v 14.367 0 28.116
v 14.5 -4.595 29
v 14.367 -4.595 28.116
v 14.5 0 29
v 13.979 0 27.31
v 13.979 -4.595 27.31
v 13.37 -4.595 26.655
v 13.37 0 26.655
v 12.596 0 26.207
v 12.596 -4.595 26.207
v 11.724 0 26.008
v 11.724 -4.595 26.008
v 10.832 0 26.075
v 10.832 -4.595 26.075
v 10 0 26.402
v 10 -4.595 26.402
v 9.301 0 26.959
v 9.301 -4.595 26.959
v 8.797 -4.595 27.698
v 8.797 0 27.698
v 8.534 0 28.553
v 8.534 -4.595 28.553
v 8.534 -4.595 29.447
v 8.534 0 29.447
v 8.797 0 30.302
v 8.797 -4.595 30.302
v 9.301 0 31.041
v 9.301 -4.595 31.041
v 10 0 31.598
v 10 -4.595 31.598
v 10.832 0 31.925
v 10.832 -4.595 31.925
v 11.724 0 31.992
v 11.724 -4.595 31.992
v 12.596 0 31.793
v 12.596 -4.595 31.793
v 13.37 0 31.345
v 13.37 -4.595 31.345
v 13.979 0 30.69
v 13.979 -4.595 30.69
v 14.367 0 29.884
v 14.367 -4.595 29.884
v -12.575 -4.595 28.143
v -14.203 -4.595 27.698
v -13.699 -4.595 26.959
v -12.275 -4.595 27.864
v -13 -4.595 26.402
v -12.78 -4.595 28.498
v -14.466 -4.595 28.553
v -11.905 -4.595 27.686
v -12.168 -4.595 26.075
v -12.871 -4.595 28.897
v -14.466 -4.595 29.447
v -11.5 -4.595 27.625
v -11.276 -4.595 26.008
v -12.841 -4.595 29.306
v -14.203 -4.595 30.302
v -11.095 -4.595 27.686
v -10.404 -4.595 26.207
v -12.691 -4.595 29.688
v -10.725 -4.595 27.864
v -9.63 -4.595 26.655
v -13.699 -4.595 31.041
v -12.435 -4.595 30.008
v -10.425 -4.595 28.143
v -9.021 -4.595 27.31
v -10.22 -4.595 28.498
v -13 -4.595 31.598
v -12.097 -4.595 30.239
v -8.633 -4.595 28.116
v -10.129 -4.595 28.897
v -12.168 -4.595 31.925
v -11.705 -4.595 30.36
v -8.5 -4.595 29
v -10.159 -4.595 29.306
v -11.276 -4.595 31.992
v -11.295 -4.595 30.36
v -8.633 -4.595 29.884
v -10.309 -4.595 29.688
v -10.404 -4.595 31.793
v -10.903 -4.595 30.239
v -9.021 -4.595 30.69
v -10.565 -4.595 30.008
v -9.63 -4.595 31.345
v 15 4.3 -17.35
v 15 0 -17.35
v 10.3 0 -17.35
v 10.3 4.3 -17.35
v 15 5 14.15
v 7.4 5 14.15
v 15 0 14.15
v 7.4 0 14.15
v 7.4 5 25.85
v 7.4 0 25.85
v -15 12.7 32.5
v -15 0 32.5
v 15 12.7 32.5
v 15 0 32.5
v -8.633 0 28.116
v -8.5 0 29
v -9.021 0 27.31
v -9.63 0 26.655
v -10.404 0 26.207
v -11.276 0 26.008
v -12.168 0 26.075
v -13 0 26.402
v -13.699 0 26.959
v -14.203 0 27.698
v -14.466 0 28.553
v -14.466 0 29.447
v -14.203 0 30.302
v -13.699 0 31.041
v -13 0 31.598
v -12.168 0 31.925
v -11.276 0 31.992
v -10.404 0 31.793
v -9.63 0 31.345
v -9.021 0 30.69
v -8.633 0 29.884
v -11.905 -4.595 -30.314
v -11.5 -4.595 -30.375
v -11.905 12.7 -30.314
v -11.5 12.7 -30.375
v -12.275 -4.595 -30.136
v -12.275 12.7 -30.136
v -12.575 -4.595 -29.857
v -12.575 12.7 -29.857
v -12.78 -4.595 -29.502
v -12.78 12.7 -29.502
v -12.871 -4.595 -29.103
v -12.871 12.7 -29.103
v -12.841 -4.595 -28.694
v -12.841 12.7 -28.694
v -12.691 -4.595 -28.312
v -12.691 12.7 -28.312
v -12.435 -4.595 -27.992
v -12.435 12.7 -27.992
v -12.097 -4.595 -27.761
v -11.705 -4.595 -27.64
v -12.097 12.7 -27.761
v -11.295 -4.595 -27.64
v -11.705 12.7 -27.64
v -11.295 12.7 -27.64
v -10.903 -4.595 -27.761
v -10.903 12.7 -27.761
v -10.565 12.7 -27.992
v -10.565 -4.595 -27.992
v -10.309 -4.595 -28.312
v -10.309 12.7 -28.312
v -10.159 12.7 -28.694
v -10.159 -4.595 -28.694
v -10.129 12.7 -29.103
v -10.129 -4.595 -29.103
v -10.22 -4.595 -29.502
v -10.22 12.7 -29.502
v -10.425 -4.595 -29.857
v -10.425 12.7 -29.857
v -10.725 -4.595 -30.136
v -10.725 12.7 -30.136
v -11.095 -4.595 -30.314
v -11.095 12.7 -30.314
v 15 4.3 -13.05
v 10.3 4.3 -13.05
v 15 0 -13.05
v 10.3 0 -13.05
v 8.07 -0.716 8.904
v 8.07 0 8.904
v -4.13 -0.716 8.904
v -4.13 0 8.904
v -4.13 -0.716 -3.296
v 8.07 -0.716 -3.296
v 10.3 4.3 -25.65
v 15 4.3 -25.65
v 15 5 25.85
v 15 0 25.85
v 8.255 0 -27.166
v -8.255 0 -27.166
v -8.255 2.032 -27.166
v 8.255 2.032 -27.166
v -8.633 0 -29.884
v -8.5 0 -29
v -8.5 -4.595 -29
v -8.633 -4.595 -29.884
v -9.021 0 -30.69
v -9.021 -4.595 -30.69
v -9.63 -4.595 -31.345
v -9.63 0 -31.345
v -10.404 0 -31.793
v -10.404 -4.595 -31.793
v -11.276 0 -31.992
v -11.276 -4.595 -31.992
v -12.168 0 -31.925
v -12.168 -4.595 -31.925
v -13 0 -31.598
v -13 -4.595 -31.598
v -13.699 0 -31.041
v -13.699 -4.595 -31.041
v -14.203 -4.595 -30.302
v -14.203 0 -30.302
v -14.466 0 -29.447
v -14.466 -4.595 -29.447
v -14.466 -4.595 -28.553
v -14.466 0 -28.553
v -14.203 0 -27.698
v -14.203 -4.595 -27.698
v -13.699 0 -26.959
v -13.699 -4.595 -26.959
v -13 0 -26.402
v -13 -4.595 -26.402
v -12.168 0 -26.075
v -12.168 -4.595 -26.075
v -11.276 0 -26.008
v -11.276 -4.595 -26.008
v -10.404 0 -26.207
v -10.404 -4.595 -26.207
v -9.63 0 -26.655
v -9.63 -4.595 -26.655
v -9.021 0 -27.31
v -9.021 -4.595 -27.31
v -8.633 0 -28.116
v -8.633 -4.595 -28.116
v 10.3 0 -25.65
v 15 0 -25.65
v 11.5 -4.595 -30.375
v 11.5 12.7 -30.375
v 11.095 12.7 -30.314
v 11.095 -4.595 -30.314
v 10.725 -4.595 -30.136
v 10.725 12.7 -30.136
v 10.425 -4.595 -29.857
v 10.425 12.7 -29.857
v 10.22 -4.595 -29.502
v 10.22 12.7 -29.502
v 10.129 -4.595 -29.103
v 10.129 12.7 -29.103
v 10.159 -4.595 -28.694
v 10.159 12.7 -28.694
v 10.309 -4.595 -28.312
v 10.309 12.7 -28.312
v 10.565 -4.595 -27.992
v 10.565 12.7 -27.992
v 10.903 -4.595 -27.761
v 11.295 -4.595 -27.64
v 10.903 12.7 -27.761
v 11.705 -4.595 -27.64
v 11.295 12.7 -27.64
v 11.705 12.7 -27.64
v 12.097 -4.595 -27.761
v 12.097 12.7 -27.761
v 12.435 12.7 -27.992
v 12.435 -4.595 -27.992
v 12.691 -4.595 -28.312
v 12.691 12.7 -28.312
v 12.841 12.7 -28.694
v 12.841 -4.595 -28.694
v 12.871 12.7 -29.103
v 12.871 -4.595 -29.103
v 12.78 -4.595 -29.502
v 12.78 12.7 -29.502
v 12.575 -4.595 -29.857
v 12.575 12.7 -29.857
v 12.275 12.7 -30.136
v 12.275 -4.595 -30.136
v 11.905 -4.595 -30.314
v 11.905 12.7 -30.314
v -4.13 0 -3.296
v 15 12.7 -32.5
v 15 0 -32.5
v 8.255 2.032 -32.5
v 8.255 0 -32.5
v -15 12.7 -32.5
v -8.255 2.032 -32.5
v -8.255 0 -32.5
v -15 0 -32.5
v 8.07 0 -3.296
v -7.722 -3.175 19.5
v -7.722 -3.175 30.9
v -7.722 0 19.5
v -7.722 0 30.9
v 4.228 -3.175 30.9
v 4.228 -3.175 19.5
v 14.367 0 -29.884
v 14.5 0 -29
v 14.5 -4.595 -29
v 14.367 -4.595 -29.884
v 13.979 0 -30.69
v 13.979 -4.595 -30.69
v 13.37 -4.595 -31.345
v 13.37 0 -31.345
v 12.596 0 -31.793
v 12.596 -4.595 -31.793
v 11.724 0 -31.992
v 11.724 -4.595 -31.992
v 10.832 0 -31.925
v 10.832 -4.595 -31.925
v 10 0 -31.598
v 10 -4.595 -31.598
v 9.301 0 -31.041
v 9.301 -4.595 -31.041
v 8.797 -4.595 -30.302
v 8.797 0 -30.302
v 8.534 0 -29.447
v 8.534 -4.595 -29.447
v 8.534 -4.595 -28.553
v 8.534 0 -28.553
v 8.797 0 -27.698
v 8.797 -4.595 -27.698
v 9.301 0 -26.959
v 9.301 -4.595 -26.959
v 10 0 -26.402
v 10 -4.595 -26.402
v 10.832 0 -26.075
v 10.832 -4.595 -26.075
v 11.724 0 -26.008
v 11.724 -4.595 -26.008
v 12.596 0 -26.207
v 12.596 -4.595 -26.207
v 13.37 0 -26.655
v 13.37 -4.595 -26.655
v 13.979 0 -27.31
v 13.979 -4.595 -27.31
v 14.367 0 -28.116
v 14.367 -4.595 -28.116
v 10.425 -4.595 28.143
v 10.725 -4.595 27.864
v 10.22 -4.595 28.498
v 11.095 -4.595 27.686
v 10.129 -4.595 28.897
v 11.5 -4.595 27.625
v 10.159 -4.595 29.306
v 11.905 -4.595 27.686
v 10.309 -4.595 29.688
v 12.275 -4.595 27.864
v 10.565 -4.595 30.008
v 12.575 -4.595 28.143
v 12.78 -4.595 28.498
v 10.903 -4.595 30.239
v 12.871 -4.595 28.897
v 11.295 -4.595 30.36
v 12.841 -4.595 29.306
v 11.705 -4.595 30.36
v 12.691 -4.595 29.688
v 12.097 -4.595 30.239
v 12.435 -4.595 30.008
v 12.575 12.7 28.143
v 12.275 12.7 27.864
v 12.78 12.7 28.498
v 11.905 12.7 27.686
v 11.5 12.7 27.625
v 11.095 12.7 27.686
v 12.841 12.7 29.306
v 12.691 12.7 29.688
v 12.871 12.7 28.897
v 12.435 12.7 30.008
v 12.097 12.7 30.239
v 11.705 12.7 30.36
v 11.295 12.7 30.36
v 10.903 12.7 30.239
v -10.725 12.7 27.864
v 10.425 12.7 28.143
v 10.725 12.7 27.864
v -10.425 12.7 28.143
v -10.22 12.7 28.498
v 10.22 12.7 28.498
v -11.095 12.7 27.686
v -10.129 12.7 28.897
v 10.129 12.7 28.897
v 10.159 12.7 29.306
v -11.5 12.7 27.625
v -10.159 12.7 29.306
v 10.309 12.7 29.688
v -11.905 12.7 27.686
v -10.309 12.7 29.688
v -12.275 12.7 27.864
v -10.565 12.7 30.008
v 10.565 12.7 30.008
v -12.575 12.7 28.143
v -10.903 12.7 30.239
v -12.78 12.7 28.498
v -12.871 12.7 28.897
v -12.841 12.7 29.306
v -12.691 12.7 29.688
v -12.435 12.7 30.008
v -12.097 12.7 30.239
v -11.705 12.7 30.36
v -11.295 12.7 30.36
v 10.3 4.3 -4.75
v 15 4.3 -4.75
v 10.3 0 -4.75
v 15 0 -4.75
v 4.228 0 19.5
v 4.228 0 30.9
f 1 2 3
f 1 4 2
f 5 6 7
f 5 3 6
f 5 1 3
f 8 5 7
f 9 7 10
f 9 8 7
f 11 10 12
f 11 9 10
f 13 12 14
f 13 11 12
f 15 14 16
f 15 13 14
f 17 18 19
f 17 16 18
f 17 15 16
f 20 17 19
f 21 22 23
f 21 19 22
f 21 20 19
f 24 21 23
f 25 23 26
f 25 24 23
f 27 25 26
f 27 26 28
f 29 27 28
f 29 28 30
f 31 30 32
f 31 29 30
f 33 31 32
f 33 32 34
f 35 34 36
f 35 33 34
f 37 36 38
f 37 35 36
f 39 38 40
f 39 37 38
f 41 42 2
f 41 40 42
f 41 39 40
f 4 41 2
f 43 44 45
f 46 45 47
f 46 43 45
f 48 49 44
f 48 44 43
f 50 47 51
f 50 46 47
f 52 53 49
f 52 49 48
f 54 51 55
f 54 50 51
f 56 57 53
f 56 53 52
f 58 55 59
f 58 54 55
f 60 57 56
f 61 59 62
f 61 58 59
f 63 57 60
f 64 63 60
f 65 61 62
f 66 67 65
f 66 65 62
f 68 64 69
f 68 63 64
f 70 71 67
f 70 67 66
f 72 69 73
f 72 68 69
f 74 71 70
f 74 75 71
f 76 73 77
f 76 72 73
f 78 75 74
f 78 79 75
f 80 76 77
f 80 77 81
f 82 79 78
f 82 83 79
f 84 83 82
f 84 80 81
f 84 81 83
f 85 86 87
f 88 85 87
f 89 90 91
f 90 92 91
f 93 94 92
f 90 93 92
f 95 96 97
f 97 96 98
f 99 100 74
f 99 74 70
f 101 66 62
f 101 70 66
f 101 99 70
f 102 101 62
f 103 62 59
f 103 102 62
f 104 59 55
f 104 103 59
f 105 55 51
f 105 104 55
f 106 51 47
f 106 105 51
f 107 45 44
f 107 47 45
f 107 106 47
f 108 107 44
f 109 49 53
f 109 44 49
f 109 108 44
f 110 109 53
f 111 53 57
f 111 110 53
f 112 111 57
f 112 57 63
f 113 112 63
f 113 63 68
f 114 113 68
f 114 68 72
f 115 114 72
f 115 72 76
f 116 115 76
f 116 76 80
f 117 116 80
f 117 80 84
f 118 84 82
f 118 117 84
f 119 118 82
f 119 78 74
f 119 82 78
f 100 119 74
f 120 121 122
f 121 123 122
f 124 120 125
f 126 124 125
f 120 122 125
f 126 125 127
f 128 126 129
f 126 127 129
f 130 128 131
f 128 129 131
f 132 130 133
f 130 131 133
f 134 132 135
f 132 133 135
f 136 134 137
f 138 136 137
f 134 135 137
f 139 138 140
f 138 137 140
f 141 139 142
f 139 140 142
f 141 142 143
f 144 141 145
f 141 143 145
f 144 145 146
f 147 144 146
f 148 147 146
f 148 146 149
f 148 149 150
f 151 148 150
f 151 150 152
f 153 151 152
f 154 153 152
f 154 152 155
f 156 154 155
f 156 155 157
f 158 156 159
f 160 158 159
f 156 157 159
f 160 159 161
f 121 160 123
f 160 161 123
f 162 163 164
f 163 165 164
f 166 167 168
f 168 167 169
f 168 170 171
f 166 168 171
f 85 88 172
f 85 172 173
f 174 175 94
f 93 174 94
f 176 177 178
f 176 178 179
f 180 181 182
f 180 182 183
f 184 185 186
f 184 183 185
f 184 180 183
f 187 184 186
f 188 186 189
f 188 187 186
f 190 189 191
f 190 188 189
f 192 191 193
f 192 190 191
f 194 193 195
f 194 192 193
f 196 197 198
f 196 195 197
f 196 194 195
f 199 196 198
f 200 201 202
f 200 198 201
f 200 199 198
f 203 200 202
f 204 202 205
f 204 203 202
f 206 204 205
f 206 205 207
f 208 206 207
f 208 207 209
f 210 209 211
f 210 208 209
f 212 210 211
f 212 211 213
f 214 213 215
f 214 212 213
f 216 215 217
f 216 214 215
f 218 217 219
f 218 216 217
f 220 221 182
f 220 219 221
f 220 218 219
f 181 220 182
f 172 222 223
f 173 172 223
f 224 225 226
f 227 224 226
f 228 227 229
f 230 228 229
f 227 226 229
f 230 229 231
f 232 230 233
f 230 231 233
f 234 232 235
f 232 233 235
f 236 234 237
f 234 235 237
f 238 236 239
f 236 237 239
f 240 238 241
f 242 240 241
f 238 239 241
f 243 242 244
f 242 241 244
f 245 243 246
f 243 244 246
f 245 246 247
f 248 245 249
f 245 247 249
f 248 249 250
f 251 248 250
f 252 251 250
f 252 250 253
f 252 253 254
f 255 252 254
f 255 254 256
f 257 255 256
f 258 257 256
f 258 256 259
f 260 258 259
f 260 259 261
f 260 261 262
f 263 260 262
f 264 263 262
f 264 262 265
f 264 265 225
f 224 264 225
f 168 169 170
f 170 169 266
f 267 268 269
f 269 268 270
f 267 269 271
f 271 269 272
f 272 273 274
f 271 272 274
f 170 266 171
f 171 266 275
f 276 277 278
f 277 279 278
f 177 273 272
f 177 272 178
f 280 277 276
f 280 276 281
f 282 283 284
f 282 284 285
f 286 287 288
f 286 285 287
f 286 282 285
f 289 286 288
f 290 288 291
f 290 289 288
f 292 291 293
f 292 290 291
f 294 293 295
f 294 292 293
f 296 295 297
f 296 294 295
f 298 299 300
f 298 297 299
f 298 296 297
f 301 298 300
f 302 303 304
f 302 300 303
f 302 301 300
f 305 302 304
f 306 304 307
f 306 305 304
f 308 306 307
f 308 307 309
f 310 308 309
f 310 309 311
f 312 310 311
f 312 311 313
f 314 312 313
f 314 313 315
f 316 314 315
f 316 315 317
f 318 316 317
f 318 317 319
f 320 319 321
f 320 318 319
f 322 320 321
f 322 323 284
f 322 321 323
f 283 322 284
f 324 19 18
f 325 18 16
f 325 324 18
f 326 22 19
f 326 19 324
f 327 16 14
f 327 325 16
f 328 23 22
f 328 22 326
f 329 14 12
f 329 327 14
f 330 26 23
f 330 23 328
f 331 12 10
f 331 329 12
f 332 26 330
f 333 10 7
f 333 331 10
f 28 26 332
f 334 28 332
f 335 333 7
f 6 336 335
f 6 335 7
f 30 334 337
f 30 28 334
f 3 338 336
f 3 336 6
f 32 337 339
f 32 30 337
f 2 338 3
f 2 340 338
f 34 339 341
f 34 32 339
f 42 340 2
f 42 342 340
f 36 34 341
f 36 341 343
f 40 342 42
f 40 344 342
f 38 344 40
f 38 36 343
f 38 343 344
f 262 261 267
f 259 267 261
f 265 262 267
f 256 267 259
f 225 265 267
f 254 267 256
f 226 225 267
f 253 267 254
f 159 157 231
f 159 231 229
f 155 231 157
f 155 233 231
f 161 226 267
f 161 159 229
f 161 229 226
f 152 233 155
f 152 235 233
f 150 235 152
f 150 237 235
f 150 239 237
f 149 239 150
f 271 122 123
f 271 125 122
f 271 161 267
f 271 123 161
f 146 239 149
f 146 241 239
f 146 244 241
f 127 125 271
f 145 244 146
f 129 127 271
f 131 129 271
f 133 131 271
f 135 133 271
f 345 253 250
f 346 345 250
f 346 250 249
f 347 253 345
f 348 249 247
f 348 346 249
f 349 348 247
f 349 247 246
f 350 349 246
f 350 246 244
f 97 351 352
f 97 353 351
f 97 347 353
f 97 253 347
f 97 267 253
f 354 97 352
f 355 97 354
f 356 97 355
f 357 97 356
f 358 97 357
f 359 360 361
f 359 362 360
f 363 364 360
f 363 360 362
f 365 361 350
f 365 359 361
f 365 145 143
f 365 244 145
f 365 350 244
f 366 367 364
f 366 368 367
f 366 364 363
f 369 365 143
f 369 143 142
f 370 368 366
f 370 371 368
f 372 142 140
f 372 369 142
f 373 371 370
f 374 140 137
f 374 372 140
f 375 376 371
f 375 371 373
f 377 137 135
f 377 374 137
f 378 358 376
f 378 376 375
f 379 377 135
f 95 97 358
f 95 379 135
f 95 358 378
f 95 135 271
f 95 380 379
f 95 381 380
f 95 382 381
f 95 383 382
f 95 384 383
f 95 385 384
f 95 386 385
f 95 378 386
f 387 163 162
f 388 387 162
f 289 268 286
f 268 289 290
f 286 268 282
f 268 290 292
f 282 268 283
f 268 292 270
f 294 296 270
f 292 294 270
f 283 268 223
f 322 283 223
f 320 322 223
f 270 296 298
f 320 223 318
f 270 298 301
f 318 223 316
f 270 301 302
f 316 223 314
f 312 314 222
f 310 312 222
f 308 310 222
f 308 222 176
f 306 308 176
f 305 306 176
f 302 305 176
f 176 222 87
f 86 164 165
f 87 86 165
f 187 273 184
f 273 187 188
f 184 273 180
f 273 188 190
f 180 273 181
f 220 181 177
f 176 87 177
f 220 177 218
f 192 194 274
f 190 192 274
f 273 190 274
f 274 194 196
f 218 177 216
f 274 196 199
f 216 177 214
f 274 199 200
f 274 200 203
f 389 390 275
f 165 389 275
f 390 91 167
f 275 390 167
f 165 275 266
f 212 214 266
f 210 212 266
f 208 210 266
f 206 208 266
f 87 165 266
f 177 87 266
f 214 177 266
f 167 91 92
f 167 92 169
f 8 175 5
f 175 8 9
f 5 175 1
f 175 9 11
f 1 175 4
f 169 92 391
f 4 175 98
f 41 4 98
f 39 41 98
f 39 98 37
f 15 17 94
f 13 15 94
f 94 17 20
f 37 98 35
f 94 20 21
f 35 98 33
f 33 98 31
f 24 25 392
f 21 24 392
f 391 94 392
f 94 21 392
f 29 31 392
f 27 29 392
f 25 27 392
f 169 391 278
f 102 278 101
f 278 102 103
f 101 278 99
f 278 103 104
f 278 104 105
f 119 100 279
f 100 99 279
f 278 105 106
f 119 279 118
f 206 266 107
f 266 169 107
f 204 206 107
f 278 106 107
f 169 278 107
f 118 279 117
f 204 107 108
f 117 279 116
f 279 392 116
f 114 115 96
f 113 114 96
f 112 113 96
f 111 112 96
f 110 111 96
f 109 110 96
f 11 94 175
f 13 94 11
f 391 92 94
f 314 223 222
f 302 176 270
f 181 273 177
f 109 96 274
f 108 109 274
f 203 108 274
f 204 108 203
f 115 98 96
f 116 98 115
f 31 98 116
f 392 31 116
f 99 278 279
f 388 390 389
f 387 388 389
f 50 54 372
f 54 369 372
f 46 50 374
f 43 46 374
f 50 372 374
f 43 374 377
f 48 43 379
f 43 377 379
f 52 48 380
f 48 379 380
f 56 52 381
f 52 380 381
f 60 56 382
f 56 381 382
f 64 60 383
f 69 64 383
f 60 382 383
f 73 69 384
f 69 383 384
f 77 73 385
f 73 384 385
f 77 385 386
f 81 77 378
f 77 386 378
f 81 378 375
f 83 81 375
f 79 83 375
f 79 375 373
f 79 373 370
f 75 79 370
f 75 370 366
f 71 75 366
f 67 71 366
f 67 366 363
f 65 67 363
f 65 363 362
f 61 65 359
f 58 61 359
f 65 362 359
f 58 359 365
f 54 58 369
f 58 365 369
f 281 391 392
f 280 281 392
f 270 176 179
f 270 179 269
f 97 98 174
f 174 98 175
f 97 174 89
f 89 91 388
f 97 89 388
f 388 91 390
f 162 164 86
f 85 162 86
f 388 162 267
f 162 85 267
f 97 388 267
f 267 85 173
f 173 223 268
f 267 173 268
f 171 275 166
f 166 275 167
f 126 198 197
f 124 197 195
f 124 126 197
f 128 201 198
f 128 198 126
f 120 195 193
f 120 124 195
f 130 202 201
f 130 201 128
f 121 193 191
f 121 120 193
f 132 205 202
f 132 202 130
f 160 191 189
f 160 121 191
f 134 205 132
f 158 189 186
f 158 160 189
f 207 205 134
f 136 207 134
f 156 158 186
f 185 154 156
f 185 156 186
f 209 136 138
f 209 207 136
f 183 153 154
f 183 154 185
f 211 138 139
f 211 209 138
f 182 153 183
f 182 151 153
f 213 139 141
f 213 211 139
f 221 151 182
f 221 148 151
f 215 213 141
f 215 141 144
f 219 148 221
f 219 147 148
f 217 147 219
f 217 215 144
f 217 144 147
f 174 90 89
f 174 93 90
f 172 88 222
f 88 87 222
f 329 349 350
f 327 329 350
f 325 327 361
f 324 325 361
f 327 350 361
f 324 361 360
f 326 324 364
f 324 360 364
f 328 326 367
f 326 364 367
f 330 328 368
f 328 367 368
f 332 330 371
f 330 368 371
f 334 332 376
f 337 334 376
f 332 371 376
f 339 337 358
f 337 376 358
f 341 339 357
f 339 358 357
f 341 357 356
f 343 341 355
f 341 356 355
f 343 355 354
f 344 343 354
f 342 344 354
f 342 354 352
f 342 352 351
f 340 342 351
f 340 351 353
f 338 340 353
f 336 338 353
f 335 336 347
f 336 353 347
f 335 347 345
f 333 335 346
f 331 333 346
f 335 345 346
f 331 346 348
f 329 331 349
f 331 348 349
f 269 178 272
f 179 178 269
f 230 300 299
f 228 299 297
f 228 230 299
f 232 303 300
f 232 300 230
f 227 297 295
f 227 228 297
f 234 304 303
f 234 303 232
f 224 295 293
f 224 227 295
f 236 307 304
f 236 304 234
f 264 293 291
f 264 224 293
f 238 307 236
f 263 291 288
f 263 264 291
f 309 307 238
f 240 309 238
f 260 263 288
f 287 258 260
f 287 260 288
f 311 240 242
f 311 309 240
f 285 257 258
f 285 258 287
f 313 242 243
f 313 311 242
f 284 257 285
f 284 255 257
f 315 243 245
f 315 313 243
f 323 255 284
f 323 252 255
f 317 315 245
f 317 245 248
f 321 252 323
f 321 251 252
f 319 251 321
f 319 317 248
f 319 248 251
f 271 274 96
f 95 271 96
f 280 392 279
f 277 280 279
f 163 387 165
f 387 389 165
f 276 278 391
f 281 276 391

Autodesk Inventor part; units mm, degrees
ref_plane "YZ Plane" through (0, 0, 0) normal (1, 0, 0) x (0, 1, 0)
ref_plane "XZ Plane" through (0, 0, 0) normal (0, 1, 0) x (-1, 0, 0)
ref_plane "XY Plane" through (0, 0, 0) normal (0, 0, 1) x (1, 0, 0)
sketch "Sketch1" plane through (0, 0, 0) normal (0, 1, 0) x (-1, 0, 0)
  line L0 (15, 32.5) -> (-15, 32.5)
  line L1 (-15, 32.5) -> (-15, -32.5)
  line L2 (-15, -32.5) -> (15, -32.5)
  line L3 (15, -32.5) -> (15, 32.5)
  point P0 (0, 0)
  dimension "d0" = 65
  dimension "d1" = 30
  dimension "d2" = 15
  dimension "d3" = 32.5
extrude "Extrusion1" add sketch "Sketch1" along normal blind 12.7
sketch "Sketch2" plane through (0, 0, 0) normal (0, -1, 0) x (1, 0, 0)
  line L0 (8.07, 8.904) -> (-4.13, 8.904)
  line L1 (-4.13, 8.904) -> (-4.13, -3.296)
  line L2 (-4.13, -3.296) -> (8.07, -3.296)
  line L3 (8.07, -3.296) -> (8.07, 8.904)
  line L4 (-15, 32.5) -> (15, 32.5) projected
  line L5 (15, 32.5) -> (15, -32.5) projected
  point P0 (0, 0)
  dimension "d6" = 12.2
  dimension "d7" = 12.2
  dimension "d8" = 23.596
  dimension "d9" = 6.93
extrude "Extrusion2" add sketch "Sketch2" along normal blind 0.716
sketch "Sketch3" plane through (0, 0, 0) normal (0, -1, 0) x (1, 0, 0)
  line L0 (15, 32.5) -> (15, -32.5) projected
  line L1 (15, 25.85) -> (7.4, 25.85)
  line L2 (7.4, 25.85) -> (7.4, 14.15)
  line L3 (7.4, 14.15) -> (15, 14.15)
  line L4 (15, 14.15) -> (15, 25.85)
  line L5 (-15, 32.5) -> (15, 32.5) projected
  point P0 (0, 0)
  dimension "d12" = 7.6
  dimension "d13" = 11.7
  dimension "d14" = 6.65
extrude "Extrusion3" cut sketch "Sketch3" against normal blind 5
sketch "Sketch4" plane through (0, 0, 0) normal (0, -1, 0) x (1, 0, 0)
  line L0 (15, 14.15) -> (15, -32.5) projected
  line L1 (15, -4.75) -> (10.3, -4.75)
  line L2 (10.3, -4.75) -> (10.3, -13.05)
  line L3 (10.3, -13.05) -> (15, -13.05)
  line L4 (15, -13.05) -> (15, -4.75)
  line L5 (-15, 32.5) -> (15, 32.5) projected
  point P0 (0, 0)
  dimension "d17" = 4.7
  dimension "d18" = 8.3
  dimension "d19" = 37.25
extrude "Extrusion4" cut sketch "Sketch4" against normal blind 4.3
sketch "Sketch5" plane through (0, 0, 0) normal (0, -1, 0) x (1, 0, 0)
  line L0 (15, -13.05) -> (15, -32.5) projected
  line L1 (15, -17.35) -> (10.3, -17.35)
  line L2 (10.3, -17.35) -> (10.3, -25.65)
  line L3 (10.3, -25.65) -> (15, -25.65)
  line L4 (15, -25.65) -> (15, -17.35)
  line L5 (15, -32.5) -> (-15, -32.5) projected
  point P0 (0, 0)
  dimension "d22" = 4.7
  dimension "d23" = 8.3
  dimension "d24" = 6.85
extrude "Extrusion5" cut sketch "Sketch5" against normal blind 4.3
sketch "Sketch6" plane through (0, 0, 0) normal (0, -1, 0) x (1, 0, 0)
  circle A0 centre (11.5, 29) radius 3
  circle A1 centre (-11.5, 29) radius 3
  circle A2 centre (-11.5, -29) radius 3
  circle A3 centre (11.5, -29) radius 3
  line L0 (15, -32.5) -> (-15, -32.5) projected
  line L1 (-15, -32.5) -> (-15, 32.5) projected
  line L2 (-15, 32.5) -> (15, 32.5) projected
  point P0 (0, 0)
  dimension "d27" = 6
  dimension "d28" = 6
  dimension "d29" = 6
  dimension "d30" = 6
  dimension "d31" = 0
  dimension "d32" = 23
  dimension "d33" = 58
  dimension "d34" = 3.5
  dimension "d35" = 23
  dimension "d37" = 0
  dimension "d38" = 3.5
  dimension "d42" = 3.5
extrude "Extrusion6" add sketch "Sketch6" along normal blind 4.595
sketch "Sketch7" plane through (11.5, -4.595, 29) normal (0, -1, 0) x (1, 0, 0)
  circle A0 centre (0, 0) radius 3 projected
  circle A1 centre (0, -58) radius 3 projected
  circle A2 centre (-23, -58) radius 3 projected
  circle A3 centre (-23, 0) radius 3 projected
  point P0 (-11.5, -29)
hole "Hole1" at (11.5, -4.595, 29) at (-11.5, -4.595, 29) at (-11.5, -4.595, -29) at (11.5, -4.595, -29) direction (0, 1, 0) diameter 2.75 depth 25.4 tip angle 118
sketch "Sketch8" plane through (0, 0, 0) normal (0, -1, 0) x (1, 0, 0)
  line L0 (15, -32.5) -> (-15, -32.5) projected
  line L1 (8.255, -32.5) -> (-8.255, -32.5)
  line L2 (-8.255, -32.5) -> (-8.255, -27.166)
  line L3 (-8.255, -27.166) -> (8.255, -27.166)
  line L4 (8.255, -27.166) -> (8.255, -32.5)
  point P0 (0, 0)
  point P1 (0, 0)
  dimension "d50" = 5.334
  dimension "d51" = 16.51
  dimension "d52" = 8.255
extrude "Extrusion7" cut sketch "Sketch8" against normal blind 2.032
sketch "Sketch9" plane through (0, 0, 0) normal (0, -1, 0) x (1, 0, 0)
  line L0 (4.228, 30.9) -> (-7.722, 30.9)
  line L1 (-7.722, 30.9) -> (-7.722, 19.5)
  line L2 (-7.722, 19.5) -> (4.228, 19.5)
  line L3 (4.228, 19.5) -> (4.228, 30.9)
  line L4 (-15, 32.5) -> (15, 32.5) projected
  line L5 (-15, -32.5) -> (-15, 32.5) projected
  line L6 (15, 32.5) -> (15, 25.85) projected
  point P0 (0, 0)
  dimension "d56" = 1.6
  dimension "d57" = 11.4
  dimension "d58" = 11.95
  dimension "d60" = 10.772
extrude "Extrusion8" add sketch "Sketch9" along normal blind 3.175
equation "\"d2\" = 0.5 * d1"
equation "\"d3\" = 0.5 * d0"
equation "\"d6\" = d7"
equation "\"d28\" = d27"
equation "\"d29\" = d27"
equation "\"d30\" = d27"
equation "\"d35\" = d32"
equation "\"d52\" = 0.5 * d51"
properties part number "Heat Block for Pi" material "Aluminum 6061"
